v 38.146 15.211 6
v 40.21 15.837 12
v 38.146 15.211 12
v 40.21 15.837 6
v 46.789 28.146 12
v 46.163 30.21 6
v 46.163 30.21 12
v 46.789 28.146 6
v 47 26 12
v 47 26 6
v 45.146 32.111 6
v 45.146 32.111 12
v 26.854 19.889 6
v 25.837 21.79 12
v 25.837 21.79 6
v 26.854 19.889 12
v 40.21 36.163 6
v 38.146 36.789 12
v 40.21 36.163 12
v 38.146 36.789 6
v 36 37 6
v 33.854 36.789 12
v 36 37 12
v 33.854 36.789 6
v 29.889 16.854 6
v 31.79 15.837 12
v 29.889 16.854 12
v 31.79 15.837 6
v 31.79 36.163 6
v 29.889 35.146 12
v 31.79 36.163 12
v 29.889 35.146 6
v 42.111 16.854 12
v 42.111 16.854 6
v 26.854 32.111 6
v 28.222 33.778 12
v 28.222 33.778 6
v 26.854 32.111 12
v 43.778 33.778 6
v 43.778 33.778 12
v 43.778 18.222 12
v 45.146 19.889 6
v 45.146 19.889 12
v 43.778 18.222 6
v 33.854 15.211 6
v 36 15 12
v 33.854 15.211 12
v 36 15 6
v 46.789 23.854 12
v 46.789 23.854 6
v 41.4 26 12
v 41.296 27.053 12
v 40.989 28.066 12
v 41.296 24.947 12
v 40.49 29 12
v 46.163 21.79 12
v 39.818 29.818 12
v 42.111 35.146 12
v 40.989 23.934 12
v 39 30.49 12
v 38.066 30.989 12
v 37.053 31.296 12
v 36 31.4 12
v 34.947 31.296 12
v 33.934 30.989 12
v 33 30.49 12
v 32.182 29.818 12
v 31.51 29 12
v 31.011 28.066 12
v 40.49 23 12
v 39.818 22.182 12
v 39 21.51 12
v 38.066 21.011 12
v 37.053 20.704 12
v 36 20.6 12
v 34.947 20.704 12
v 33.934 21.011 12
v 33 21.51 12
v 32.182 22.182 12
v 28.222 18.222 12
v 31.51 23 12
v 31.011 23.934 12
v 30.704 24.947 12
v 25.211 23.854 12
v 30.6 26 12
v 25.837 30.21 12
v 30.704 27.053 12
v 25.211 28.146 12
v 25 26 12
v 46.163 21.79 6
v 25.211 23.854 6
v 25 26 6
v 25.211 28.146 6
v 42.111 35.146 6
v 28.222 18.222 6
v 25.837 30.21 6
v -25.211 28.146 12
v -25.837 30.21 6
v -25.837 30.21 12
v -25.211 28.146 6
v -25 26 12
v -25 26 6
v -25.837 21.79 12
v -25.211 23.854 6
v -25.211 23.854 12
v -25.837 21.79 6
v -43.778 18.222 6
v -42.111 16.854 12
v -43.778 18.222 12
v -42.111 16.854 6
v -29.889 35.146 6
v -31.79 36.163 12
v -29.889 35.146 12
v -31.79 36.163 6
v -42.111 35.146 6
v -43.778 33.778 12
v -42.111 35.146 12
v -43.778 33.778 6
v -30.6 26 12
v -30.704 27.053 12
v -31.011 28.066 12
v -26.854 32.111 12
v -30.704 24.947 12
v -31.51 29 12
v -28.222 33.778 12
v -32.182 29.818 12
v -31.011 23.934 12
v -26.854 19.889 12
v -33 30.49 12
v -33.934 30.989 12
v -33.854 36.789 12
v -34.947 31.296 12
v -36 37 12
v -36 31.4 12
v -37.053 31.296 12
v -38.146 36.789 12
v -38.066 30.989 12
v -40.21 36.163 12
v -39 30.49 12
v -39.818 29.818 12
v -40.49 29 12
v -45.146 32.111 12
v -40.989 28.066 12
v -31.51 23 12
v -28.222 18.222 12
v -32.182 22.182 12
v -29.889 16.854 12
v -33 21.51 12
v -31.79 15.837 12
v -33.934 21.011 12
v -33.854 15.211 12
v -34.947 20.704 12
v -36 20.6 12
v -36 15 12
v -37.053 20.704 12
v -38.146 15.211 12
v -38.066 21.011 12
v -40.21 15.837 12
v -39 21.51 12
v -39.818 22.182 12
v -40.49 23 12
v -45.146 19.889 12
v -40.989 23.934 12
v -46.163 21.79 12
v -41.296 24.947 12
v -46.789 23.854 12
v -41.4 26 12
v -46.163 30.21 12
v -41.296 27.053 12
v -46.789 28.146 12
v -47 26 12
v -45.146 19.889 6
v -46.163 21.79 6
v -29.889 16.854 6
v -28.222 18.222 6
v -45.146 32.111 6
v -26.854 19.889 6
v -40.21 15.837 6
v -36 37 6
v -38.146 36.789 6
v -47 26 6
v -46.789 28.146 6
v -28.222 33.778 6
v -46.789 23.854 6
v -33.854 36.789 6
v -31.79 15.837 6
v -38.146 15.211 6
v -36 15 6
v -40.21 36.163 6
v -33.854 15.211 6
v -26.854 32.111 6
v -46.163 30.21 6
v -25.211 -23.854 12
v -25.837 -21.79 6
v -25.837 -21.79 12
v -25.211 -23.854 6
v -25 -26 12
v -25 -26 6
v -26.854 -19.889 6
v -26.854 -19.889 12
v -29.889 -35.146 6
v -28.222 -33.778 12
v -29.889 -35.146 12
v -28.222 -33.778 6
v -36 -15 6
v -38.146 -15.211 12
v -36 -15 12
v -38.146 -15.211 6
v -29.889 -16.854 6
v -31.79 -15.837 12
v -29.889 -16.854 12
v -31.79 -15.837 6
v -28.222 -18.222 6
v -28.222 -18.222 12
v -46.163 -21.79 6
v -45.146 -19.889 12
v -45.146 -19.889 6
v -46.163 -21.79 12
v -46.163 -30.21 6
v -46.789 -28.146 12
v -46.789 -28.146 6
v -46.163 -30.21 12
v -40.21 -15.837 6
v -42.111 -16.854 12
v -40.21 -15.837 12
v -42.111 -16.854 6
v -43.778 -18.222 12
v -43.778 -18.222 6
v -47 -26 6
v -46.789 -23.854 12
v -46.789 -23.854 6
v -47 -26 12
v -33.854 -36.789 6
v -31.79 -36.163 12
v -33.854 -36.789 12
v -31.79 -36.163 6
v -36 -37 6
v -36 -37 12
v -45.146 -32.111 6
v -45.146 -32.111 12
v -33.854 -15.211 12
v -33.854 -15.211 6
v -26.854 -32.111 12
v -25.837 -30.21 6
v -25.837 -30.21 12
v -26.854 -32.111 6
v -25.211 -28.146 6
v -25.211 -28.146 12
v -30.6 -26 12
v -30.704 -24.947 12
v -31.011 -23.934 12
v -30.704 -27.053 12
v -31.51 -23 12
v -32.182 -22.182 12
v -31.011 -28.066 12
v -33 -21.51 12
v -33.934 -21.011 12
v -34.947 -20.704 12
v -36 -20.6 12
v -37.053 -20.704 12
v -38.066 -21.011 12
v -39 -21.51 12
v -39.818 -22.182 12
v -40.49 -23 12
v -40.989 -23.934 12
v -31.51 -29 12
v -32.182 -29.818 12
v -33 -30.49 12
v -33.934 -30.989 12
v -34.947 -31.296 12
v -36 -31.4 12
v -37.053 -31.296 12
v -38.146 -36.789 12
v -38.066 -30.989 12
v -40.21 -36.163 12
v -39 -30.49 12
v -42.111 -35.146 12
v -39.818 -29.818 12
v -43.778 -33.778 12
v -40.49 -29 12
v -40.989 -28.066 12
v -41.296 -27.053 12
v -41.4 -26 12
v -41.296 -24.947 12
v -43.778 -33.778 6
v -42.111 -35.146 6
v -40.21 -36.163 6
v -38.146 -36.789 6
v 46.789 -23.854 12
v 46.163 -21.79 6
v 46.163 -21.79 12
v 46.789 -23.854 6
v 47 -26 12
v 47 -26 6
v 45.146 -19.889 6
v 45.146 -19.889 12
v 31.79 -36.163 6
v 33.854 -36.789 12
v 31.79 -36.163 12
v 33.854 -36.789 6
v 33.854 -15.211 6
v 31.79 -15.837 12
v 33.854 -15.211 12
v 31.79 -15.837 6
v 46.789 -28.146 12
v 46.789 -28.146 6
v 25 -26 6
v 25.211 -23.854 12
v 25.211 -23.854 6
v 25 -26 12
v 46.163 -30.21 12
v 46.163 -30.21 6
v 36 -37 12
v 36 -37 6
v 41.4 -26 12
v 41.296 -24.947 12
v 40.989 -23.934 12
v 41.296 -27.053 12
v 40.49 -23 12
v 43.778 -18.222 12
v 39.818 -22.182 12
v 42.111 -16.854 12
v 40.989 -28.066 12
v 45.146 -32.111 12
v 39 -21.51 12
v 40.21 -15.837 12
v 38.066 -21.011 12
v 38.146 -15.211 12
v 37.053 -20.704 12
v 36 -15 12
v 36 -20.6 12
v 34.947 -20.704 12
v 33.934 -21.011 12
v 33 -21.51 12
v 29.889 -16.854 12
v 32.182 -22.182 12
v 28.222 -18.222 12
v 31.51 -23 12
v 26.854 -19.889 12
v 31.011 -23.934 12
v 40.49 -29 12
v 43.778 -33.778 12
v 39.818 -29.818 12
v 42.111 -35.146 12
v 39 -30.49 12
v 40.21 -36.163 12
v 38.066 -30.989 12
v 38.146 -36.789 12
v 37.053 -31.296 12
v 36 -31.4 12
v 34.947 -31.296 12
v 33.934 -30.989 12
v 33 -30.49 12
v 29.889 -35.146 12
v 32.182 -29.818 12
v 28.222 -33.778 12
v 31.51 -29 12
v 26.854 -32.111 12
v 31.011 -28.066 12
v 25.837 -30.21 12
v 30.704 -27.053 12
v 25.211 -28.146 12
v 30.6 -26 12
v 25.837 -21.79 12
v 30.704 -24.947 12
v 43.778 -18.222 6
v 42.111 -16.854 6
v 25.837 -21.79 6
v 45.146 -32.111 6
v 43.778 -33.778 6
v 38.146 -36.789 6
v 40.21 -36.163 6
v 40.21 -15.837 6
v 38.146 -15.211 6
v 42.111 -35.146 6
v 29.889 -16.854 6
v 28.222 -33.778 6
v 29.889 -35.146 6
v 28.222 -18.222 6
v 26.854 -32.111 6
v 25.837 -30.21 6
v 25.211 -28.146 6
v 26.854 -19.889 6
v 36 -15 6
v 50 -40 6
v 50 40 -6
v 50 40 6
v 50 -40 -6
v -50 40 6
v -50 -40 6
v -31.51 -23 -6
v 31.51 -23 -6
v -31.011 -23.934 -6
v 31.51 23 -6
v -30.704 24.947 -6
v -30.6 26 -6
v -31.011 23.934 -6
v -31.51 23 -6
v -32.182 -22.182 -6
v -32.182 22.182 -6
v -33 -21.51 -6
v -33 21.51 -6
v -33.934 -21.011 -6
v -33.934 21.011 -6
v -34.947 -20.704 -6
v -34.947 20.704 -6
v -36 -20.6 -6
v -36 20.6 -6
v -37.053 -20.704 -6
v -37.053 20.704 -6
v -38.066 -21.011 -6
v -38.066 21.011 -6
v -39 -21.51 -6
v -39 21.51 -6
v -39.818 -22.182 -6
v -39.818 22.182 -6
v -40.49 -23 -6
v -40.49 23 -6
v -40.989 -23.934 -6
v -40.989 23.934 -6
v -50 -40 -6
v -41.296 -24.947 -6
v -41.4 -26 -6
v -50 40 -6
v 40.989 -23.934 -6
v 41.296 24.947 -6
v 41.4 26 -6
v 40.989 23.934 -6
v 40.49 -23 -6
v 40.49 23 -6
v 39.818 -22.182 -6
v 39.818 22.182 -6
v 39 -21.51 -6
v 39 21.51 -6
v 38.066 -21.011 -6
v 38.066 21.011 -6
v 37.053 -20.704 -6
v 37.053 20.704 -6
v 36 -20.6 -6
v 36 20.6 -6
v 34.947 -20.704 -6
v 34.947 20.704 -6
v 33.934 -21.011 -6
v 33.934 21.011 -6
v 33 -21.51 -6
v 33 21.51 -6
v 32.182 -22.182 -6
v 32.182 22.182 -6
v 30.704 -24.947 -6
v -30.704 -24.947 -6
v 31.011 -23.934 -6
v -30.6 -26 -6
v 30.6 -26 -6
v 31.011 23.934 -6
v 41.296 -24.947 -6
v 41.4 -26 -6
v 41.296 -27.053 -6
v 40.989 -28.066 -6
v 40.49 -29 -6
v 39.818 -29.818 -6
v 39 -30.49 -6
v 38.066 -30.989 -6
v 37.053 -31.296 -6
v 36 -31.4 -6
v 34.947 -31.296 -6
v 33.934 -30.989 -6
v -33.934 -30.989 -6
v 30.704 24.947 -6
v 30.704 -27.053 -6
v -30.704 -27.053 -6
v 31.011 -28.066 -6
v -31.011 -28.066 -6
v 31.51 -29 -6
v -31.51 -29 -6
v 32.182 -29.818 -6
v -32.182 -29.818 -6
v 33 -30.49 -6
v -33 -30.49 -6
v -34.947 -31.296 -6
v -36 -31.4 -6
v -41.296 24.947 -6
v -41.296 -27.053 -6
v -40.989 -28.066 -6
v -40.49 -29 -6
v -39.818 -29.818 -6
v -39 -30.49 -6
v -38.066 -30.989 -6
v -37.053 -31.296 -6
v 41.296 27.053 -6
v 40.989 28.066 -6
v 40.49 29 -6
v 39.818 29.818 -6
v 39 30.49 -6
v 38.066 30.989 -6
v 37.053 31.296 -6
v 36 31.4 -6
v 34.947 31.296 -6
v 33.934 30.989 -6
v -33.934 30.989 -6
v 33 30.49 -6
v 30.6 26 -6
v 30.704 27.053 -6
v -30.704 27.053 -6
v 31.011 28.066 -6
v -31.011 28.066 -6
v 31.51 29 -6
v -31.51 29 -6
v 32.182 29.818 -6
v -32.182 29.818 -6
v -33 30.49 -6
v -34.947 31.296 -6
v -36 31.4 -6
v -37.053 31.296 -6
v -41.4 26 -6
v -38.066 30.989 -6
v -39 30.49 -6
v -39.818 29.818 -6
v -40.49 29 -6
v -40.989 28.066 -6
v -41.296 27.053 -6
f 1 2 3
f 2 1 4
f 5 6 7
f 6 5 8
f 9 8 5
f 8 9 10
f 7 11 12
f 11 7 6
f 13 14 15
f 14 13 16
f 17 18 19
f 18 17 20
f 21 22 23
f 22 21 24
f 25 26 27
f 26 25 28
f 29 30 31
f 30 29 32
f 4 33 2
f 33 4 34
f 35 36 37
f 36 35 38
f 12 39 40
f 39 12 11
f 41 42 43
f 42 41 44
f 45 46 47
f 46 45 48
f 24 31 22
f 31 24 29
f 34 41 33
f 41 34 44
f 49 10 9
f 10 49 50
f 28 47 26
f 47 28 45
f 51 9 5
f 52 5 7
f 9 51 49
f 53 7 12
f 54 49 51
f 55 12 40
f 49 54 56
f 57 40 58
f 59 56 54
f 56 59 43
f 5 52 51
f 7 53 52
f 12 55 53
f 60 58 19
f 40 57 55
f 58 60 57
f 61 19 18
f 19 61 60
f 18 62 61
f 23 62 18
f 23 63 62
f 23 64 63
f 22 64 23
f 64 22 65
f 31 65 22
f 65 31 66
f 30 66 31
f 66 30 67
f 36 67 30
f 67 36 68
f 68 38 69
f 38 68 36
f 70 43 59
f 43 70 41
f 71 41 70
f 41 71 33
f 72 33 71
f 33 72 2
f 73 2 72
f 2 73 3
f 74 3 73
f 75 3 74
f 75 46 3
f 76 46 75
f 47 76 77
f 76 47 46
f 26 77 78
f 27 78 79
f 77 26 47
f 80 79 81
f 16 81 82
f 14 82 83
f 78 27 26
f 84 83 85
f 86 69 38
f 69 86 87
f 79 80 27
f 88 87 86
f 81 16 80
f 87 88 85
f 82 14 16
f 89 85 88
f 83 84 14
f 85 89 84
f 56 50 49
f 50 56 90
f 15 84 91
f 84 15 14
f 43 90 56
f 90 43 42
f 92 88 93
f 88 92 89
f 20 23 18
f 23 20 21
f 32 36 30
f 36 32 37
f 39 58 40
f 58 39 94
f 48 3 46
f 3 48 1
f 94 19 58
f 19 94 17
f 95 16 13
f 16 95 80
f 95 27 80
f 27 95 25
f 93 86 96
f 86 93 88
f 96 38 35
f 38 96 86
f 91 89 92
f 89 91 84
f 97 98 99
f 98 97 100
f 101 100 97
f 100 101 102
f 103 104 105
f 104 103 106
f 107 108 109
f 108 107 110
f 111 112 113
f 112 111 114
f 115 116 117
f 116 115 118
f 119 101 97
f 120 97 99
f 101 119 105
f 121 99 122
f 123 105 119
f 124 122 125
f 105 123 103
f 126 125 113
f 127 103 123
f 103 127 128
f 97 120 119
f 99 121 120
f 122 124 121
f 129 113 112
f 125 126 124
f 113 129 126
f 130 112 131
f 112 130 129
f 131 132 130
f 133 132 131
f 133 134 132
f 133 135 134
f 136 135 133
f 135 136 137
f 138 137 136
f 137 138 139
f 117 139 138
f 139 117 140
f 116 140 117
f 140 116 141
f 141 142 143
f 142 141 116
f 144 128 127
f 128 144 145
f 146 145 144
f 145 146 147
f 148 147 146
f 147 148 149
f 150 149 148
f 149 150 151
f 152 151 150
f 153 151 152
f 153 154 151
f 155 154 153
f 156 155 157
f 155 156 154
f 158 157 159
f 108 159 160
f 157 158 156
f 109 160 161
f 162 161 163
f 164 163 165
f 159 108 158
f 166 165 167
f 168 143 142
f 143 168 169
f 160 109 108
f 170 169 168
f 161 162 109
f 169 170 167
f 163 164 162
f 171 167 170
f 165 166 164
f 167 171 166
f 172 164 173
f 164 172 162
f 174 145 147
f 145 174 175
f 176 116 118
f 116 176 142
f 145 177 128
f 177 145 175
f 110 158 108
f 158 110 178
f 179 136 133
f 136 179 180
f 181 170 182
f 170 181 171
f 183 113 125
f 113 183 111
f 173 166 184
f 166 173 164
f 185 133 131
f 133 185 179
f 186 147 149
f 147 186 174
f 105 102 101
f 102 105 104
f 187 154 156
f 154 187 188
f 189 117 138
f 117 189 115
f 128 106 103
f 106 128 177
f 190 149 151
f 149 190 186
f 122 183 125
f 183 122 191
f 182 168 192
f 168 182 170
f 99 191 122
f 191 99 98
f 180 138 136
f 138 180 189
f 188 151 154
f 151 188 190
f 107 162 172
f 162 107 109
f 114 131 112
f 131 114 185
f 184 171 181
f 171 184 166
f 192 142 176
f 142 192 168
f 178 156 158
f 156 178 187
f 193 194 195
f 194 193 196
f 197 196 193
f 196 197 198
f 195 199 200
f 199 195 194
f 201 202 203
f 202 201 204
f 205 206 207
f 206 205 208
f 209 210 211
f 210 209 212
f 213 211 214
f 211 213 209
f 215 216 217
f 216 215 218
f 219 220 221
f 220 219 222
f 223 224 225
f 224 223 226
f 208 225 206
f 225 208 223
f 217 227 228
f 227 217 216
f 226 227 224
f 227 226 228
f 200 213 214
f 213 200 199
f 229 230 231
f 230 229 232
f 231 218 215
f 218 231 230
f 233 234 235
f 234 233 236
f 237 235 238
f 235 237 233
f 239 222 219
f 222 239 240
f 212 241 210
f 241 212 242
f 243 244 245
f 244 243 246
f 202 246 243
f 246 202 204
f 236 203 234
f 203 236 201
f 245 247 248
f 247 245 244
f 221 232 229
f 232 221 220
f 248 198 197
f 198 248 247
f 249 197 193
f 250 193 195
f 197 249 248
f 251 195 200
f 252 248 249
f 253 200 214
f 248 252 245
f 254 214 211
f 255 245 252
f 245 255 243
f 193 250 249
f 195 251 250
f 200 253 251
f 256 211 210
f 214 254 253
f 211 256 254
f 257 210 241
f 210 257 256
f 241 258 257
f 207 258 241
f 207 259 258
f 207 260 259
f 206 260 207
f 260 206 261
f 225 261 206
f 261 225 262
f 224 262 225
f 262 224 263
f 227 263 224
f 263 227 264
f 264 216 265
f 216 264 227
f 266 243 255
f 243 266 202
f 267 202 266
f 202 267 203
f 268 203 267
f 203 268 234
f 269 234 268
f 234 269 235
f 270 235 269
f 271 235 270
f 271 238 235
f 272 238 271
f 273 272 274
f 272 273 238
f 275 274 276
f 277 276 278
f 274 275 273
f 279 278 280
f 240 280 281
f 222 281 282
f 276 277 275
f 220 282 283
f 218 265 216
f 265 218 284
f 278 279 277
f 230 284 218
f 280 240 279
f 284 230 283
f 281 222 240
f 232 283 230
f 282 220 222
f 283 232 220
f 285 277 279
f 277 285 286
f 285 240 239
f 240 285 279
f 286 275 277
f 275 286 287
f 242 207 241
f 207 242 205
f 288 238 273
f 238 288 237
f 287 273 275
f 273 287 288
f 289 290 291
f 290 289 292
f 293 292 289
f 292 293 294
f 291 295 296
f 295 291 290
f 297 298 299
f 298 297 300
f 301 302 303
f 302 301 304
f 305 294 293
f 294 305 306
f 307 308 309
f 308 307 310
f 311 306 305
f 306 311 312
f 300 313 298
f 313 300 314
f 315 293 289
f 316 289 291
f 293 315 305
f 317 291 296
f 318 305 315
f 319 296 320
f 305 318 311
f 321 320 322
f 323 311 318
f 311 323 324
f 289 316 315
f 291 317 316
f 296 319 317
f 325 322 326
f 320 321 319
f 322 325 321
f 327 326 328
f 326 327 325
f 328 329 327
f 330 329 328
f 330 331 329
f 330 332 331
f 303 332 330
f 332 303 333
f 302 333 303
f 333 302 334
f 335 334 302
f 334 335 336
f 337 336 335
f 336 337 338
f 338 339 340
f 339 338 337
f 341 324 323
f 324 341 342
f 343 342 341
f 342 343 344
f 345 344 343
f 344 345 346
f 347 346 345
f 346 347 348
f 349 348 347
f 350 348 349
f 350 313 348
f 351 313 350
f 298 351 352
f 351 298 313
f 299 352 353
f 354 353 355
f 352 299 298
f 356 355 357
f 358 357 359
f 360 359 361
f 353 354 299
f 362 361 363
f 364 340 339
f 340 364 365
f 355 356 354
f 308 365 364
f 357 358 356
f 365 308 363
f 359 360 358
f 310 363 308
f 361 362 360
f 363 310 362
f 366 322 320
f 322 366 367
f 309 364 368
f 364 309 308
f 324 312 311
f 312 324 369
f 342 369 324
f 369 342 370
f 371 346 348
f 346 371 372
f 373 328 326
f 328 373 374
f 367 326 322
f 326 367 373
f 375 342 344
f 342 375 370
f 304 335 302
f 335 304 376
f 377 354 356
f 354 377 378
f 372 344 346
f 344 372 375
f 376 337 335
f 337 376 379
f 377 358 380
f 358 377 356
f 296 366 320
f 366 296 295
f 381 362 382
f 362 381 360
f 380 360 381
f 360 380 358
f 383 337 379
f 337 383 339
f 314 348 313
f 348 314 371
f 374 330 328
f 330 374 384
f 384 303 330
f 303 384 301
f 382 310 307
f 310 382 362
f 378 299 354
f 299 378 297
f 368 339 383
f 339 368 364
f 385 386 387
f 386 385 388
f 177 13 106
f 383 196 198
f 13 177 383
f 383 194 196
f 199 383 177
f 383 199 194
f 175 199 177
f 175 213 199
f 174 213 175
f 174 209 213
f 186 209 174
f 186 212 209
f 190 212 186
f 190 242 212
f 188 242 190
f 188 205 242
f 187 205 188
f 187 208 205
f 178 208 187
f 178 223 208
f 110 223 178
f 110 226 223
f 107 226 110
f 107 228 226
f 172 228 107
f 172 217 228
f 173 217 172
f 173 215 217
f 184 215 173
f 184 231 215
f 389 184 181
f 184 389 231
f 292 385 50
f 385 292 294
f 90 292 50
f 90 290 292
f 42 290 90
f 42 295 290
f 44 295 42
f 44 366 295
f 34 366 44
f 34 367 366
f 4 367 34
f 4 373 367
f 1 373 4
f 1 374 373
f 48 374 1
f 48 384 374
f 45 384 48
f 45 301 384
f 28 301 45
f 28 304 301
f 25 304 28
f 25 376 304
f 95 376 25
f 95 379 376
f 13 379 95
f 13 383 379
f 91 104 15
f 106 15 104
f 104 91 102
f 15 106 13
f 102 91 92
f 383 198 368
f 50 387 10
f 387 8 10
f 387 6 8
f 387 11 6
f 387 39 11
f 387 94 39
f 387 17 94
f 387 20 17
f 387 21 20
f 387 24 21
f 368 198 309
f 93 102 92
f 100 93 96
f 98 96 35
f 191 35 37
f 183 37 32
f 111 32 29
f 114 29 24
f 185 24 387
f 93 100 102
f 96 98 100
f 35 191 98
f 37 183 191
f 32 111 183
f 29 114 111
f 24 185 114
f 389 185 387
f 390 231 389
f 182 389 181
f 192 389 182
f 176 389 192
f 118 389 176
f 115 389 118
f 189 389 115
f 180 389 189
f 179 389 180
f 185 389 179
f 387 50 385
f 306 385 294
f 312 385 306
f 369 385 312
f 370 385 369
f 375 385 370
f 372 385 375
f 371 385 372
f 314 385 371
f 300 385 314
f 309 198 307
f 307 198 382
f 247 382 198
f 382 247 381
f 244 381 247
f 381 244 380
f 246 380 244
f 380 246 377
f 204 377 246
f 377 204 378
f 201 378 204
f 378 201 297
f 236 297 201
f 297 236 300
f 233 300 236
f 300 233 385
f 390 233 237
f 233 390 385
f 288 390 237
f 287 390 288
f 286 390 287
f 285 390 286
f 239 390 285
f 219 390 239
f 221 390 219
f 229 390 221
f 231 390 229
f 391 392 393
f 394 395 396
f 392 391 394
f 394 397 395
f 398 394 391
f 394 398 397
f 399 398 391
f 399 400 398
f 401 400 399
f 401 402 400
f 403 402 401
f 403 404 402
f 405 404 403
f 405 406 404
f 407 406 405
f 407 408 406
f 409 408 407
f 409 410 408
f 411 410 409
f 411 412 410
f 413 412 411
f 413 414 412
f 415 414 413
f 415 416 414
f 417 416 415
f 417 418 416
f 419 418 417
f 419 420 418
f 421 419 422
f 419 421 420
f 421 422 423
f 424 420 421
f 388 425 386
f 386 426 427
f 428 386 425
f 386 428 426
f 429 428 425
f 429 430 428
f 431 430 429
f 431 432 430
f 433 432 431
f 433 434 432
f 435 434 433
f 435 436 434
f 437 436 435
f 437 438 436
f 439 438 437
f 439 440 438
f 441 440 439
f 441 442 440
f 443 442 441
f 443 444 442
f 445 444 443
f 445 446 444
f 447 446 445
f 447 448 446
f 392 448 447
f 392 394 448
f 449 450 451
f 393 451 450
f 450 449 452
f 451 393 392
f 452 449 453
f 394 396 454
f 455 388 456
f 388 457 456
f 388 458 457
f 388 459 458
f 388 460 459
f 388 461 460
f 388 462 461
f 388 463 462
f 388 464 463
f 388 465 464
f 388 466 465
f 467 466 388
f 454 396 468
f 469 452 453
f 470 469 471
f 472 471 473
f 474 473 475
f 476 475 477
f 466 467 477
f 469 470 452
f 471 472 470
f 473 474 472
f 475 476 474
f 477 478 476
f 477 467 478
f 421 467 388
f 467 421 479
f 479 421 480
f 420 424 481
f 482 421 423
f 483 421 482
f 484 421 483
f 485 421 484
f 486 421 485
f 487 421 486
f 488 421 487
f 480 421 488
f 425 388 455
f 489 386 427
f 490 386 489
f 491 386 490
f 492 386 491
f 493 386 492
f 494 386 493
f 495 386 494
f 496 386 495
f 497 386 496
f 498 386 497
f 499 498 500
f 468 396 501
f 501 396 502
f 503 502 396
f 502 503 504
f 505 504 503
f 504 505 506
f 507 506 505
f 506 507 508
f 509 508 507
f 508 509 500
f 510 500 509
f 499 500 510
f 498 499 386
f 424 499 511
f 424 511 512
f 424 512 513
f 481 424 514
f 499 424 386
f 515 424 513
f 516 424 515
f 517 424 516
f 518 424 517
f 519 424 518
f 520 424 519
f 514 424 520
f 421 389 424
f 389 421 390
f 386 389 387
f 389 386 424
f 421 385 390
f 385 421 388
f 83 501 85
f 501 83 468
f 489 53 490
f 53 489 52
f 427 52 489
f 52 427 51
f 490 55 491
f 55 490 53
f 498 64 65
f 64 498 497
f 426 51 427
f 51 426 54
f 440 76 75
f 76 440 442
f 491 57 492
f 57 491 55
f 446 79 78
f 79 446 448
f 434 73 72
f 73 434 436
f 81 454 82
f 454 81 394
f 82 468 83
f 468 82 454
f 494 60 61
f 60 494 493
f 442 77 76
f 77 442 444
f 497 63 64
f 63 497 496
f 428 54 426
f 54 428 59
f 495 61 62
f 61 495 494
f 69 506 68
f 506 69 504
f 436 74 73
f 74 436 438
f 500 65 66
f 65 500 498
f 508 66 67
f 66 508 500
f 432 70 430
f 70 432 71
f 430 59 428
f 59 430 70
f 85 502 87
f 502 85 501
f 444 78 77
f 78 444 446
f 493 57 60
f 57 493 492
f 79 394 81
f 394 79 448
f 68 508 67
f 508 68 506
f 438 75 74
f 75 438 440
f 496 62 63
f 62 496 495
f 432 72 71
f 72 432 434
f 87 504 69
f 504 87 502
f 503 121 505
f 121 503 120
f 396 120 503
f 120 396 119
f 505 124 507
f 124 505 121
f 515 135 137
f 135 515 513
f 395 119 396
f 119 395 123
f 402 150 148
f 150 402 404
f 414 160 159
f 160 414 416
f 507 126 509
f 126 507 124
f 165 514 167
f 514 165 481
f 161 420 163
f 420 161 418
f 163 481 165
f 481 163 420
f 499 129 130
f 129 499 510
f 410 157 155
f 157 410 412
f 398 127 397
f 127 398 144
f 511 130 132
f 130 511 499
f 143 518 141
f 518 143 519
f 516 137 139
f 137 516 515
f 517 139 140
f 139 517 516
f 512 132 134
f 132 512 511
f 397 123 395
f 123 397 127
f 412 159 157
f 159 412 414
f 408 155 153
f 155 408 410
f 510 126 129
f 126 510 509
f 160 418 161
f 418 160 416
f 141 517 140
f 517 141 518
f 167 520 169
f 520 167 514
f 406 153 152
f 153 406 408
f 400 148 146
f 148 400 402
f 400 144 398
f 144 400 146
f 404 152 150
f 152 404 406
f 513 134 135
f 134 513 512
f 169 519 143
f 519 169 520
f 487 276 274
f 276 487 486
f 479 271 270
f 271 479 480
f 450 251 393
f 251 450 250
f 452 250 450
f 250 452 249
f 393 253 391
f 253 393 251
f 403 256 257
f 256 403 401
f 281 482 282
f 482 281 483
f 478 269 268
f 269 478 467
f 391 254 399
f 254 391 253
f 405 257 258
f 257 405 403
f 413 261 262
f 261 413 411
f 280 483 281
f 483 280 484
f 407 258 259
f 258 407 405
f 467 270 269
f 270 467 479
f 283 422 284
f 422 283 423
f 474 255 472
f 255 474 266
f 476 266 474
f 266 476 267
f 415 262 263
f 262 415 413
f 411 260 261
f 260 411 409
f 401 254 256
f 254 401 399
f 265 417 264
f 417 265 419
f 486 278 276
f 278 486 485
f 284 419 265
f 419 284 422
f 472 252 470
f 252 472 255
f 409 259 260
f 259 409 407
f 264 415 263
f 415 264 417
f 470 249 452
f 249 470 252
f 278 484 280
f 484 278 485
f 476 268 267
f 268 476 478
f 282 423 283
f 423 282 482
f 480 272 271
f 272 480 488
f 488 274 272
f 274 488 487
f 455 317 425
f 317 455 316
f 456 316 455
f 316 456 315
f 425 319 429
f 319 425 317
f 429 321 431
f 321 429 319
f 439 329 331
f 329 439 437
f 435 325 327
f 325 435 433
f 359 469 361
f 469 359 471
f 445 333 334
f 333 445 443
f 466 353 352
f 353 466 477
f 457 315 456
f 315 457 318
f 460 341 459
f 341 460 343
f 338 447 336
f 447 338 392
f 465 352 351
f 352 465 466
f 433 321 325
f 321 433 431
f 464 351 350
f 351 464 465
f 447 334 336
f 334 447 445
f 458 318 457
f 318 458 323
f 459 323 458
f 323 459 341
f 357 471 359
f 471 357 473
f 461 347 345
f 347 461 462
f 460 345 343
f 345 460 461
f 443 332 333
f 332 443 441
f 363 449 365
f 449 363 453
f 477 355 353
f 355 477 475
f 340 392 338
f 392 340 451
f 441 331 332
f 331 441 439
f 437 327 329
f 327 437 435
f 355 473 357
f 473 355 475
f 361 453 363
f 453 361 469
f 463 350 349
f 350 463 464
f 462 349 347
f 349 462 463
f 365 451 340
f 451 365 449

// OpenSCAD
$fn = 32;

// ----------------------------------------------------------------------
// Anchor pads 100 x 80 x 18
// four corner bosses with anchor holes
// ----------------------------------------------------------------------

// --- parameters (mm) ---
plate = [100, 80, 12];  // base plate size (x, y, z)
pads = 4;               // boss count, one per corner
edge = 14;              // boss centre offset from the plate edge
boss_d = 22;            // boss diameter
boss_h = 6;             // boss height above the base plate
bore_d = 10.5;          // nominal hole diameter from the drawing
print_allowance = 0.3;  // clearance added for printing

// --- derived feature positions (mm) ---
hole_d = bore_d + print_allowance;  // = 10.8   hole diameter as printed
height = plate[2] + boss_h;         // = 18   overall height of the part
corner_x = plate[0] / 2 - edge;     // = 36   boss centre X
corner_y = plate[1] / 2 - edge;     // = 26   boss centre Y
feature_centers = [
  [corner_x, corner_y],
  [-corner_x, corner_y],
  [-corner_x, -corner_y],
  [corner_x, -corner_y]
];   // boss centres, anchor holes are drilled there

// base plate, four bosses standing on it, anchor holes all the way through
difference() {
  union() {
    cube(plate, center = true);
    for (centre = feature_centers)
      translate([centre[0], centre[1], plate[2] / 2 - 1])
        cylinder(d = boss_d, h = boss_h + 1);
  }
  for (centre = feature_centers)
    translate([centre[0], centre[1], -height])
      cylinder(d = hole_d, h = 2 * height + 2);  // through boss and plate
}
